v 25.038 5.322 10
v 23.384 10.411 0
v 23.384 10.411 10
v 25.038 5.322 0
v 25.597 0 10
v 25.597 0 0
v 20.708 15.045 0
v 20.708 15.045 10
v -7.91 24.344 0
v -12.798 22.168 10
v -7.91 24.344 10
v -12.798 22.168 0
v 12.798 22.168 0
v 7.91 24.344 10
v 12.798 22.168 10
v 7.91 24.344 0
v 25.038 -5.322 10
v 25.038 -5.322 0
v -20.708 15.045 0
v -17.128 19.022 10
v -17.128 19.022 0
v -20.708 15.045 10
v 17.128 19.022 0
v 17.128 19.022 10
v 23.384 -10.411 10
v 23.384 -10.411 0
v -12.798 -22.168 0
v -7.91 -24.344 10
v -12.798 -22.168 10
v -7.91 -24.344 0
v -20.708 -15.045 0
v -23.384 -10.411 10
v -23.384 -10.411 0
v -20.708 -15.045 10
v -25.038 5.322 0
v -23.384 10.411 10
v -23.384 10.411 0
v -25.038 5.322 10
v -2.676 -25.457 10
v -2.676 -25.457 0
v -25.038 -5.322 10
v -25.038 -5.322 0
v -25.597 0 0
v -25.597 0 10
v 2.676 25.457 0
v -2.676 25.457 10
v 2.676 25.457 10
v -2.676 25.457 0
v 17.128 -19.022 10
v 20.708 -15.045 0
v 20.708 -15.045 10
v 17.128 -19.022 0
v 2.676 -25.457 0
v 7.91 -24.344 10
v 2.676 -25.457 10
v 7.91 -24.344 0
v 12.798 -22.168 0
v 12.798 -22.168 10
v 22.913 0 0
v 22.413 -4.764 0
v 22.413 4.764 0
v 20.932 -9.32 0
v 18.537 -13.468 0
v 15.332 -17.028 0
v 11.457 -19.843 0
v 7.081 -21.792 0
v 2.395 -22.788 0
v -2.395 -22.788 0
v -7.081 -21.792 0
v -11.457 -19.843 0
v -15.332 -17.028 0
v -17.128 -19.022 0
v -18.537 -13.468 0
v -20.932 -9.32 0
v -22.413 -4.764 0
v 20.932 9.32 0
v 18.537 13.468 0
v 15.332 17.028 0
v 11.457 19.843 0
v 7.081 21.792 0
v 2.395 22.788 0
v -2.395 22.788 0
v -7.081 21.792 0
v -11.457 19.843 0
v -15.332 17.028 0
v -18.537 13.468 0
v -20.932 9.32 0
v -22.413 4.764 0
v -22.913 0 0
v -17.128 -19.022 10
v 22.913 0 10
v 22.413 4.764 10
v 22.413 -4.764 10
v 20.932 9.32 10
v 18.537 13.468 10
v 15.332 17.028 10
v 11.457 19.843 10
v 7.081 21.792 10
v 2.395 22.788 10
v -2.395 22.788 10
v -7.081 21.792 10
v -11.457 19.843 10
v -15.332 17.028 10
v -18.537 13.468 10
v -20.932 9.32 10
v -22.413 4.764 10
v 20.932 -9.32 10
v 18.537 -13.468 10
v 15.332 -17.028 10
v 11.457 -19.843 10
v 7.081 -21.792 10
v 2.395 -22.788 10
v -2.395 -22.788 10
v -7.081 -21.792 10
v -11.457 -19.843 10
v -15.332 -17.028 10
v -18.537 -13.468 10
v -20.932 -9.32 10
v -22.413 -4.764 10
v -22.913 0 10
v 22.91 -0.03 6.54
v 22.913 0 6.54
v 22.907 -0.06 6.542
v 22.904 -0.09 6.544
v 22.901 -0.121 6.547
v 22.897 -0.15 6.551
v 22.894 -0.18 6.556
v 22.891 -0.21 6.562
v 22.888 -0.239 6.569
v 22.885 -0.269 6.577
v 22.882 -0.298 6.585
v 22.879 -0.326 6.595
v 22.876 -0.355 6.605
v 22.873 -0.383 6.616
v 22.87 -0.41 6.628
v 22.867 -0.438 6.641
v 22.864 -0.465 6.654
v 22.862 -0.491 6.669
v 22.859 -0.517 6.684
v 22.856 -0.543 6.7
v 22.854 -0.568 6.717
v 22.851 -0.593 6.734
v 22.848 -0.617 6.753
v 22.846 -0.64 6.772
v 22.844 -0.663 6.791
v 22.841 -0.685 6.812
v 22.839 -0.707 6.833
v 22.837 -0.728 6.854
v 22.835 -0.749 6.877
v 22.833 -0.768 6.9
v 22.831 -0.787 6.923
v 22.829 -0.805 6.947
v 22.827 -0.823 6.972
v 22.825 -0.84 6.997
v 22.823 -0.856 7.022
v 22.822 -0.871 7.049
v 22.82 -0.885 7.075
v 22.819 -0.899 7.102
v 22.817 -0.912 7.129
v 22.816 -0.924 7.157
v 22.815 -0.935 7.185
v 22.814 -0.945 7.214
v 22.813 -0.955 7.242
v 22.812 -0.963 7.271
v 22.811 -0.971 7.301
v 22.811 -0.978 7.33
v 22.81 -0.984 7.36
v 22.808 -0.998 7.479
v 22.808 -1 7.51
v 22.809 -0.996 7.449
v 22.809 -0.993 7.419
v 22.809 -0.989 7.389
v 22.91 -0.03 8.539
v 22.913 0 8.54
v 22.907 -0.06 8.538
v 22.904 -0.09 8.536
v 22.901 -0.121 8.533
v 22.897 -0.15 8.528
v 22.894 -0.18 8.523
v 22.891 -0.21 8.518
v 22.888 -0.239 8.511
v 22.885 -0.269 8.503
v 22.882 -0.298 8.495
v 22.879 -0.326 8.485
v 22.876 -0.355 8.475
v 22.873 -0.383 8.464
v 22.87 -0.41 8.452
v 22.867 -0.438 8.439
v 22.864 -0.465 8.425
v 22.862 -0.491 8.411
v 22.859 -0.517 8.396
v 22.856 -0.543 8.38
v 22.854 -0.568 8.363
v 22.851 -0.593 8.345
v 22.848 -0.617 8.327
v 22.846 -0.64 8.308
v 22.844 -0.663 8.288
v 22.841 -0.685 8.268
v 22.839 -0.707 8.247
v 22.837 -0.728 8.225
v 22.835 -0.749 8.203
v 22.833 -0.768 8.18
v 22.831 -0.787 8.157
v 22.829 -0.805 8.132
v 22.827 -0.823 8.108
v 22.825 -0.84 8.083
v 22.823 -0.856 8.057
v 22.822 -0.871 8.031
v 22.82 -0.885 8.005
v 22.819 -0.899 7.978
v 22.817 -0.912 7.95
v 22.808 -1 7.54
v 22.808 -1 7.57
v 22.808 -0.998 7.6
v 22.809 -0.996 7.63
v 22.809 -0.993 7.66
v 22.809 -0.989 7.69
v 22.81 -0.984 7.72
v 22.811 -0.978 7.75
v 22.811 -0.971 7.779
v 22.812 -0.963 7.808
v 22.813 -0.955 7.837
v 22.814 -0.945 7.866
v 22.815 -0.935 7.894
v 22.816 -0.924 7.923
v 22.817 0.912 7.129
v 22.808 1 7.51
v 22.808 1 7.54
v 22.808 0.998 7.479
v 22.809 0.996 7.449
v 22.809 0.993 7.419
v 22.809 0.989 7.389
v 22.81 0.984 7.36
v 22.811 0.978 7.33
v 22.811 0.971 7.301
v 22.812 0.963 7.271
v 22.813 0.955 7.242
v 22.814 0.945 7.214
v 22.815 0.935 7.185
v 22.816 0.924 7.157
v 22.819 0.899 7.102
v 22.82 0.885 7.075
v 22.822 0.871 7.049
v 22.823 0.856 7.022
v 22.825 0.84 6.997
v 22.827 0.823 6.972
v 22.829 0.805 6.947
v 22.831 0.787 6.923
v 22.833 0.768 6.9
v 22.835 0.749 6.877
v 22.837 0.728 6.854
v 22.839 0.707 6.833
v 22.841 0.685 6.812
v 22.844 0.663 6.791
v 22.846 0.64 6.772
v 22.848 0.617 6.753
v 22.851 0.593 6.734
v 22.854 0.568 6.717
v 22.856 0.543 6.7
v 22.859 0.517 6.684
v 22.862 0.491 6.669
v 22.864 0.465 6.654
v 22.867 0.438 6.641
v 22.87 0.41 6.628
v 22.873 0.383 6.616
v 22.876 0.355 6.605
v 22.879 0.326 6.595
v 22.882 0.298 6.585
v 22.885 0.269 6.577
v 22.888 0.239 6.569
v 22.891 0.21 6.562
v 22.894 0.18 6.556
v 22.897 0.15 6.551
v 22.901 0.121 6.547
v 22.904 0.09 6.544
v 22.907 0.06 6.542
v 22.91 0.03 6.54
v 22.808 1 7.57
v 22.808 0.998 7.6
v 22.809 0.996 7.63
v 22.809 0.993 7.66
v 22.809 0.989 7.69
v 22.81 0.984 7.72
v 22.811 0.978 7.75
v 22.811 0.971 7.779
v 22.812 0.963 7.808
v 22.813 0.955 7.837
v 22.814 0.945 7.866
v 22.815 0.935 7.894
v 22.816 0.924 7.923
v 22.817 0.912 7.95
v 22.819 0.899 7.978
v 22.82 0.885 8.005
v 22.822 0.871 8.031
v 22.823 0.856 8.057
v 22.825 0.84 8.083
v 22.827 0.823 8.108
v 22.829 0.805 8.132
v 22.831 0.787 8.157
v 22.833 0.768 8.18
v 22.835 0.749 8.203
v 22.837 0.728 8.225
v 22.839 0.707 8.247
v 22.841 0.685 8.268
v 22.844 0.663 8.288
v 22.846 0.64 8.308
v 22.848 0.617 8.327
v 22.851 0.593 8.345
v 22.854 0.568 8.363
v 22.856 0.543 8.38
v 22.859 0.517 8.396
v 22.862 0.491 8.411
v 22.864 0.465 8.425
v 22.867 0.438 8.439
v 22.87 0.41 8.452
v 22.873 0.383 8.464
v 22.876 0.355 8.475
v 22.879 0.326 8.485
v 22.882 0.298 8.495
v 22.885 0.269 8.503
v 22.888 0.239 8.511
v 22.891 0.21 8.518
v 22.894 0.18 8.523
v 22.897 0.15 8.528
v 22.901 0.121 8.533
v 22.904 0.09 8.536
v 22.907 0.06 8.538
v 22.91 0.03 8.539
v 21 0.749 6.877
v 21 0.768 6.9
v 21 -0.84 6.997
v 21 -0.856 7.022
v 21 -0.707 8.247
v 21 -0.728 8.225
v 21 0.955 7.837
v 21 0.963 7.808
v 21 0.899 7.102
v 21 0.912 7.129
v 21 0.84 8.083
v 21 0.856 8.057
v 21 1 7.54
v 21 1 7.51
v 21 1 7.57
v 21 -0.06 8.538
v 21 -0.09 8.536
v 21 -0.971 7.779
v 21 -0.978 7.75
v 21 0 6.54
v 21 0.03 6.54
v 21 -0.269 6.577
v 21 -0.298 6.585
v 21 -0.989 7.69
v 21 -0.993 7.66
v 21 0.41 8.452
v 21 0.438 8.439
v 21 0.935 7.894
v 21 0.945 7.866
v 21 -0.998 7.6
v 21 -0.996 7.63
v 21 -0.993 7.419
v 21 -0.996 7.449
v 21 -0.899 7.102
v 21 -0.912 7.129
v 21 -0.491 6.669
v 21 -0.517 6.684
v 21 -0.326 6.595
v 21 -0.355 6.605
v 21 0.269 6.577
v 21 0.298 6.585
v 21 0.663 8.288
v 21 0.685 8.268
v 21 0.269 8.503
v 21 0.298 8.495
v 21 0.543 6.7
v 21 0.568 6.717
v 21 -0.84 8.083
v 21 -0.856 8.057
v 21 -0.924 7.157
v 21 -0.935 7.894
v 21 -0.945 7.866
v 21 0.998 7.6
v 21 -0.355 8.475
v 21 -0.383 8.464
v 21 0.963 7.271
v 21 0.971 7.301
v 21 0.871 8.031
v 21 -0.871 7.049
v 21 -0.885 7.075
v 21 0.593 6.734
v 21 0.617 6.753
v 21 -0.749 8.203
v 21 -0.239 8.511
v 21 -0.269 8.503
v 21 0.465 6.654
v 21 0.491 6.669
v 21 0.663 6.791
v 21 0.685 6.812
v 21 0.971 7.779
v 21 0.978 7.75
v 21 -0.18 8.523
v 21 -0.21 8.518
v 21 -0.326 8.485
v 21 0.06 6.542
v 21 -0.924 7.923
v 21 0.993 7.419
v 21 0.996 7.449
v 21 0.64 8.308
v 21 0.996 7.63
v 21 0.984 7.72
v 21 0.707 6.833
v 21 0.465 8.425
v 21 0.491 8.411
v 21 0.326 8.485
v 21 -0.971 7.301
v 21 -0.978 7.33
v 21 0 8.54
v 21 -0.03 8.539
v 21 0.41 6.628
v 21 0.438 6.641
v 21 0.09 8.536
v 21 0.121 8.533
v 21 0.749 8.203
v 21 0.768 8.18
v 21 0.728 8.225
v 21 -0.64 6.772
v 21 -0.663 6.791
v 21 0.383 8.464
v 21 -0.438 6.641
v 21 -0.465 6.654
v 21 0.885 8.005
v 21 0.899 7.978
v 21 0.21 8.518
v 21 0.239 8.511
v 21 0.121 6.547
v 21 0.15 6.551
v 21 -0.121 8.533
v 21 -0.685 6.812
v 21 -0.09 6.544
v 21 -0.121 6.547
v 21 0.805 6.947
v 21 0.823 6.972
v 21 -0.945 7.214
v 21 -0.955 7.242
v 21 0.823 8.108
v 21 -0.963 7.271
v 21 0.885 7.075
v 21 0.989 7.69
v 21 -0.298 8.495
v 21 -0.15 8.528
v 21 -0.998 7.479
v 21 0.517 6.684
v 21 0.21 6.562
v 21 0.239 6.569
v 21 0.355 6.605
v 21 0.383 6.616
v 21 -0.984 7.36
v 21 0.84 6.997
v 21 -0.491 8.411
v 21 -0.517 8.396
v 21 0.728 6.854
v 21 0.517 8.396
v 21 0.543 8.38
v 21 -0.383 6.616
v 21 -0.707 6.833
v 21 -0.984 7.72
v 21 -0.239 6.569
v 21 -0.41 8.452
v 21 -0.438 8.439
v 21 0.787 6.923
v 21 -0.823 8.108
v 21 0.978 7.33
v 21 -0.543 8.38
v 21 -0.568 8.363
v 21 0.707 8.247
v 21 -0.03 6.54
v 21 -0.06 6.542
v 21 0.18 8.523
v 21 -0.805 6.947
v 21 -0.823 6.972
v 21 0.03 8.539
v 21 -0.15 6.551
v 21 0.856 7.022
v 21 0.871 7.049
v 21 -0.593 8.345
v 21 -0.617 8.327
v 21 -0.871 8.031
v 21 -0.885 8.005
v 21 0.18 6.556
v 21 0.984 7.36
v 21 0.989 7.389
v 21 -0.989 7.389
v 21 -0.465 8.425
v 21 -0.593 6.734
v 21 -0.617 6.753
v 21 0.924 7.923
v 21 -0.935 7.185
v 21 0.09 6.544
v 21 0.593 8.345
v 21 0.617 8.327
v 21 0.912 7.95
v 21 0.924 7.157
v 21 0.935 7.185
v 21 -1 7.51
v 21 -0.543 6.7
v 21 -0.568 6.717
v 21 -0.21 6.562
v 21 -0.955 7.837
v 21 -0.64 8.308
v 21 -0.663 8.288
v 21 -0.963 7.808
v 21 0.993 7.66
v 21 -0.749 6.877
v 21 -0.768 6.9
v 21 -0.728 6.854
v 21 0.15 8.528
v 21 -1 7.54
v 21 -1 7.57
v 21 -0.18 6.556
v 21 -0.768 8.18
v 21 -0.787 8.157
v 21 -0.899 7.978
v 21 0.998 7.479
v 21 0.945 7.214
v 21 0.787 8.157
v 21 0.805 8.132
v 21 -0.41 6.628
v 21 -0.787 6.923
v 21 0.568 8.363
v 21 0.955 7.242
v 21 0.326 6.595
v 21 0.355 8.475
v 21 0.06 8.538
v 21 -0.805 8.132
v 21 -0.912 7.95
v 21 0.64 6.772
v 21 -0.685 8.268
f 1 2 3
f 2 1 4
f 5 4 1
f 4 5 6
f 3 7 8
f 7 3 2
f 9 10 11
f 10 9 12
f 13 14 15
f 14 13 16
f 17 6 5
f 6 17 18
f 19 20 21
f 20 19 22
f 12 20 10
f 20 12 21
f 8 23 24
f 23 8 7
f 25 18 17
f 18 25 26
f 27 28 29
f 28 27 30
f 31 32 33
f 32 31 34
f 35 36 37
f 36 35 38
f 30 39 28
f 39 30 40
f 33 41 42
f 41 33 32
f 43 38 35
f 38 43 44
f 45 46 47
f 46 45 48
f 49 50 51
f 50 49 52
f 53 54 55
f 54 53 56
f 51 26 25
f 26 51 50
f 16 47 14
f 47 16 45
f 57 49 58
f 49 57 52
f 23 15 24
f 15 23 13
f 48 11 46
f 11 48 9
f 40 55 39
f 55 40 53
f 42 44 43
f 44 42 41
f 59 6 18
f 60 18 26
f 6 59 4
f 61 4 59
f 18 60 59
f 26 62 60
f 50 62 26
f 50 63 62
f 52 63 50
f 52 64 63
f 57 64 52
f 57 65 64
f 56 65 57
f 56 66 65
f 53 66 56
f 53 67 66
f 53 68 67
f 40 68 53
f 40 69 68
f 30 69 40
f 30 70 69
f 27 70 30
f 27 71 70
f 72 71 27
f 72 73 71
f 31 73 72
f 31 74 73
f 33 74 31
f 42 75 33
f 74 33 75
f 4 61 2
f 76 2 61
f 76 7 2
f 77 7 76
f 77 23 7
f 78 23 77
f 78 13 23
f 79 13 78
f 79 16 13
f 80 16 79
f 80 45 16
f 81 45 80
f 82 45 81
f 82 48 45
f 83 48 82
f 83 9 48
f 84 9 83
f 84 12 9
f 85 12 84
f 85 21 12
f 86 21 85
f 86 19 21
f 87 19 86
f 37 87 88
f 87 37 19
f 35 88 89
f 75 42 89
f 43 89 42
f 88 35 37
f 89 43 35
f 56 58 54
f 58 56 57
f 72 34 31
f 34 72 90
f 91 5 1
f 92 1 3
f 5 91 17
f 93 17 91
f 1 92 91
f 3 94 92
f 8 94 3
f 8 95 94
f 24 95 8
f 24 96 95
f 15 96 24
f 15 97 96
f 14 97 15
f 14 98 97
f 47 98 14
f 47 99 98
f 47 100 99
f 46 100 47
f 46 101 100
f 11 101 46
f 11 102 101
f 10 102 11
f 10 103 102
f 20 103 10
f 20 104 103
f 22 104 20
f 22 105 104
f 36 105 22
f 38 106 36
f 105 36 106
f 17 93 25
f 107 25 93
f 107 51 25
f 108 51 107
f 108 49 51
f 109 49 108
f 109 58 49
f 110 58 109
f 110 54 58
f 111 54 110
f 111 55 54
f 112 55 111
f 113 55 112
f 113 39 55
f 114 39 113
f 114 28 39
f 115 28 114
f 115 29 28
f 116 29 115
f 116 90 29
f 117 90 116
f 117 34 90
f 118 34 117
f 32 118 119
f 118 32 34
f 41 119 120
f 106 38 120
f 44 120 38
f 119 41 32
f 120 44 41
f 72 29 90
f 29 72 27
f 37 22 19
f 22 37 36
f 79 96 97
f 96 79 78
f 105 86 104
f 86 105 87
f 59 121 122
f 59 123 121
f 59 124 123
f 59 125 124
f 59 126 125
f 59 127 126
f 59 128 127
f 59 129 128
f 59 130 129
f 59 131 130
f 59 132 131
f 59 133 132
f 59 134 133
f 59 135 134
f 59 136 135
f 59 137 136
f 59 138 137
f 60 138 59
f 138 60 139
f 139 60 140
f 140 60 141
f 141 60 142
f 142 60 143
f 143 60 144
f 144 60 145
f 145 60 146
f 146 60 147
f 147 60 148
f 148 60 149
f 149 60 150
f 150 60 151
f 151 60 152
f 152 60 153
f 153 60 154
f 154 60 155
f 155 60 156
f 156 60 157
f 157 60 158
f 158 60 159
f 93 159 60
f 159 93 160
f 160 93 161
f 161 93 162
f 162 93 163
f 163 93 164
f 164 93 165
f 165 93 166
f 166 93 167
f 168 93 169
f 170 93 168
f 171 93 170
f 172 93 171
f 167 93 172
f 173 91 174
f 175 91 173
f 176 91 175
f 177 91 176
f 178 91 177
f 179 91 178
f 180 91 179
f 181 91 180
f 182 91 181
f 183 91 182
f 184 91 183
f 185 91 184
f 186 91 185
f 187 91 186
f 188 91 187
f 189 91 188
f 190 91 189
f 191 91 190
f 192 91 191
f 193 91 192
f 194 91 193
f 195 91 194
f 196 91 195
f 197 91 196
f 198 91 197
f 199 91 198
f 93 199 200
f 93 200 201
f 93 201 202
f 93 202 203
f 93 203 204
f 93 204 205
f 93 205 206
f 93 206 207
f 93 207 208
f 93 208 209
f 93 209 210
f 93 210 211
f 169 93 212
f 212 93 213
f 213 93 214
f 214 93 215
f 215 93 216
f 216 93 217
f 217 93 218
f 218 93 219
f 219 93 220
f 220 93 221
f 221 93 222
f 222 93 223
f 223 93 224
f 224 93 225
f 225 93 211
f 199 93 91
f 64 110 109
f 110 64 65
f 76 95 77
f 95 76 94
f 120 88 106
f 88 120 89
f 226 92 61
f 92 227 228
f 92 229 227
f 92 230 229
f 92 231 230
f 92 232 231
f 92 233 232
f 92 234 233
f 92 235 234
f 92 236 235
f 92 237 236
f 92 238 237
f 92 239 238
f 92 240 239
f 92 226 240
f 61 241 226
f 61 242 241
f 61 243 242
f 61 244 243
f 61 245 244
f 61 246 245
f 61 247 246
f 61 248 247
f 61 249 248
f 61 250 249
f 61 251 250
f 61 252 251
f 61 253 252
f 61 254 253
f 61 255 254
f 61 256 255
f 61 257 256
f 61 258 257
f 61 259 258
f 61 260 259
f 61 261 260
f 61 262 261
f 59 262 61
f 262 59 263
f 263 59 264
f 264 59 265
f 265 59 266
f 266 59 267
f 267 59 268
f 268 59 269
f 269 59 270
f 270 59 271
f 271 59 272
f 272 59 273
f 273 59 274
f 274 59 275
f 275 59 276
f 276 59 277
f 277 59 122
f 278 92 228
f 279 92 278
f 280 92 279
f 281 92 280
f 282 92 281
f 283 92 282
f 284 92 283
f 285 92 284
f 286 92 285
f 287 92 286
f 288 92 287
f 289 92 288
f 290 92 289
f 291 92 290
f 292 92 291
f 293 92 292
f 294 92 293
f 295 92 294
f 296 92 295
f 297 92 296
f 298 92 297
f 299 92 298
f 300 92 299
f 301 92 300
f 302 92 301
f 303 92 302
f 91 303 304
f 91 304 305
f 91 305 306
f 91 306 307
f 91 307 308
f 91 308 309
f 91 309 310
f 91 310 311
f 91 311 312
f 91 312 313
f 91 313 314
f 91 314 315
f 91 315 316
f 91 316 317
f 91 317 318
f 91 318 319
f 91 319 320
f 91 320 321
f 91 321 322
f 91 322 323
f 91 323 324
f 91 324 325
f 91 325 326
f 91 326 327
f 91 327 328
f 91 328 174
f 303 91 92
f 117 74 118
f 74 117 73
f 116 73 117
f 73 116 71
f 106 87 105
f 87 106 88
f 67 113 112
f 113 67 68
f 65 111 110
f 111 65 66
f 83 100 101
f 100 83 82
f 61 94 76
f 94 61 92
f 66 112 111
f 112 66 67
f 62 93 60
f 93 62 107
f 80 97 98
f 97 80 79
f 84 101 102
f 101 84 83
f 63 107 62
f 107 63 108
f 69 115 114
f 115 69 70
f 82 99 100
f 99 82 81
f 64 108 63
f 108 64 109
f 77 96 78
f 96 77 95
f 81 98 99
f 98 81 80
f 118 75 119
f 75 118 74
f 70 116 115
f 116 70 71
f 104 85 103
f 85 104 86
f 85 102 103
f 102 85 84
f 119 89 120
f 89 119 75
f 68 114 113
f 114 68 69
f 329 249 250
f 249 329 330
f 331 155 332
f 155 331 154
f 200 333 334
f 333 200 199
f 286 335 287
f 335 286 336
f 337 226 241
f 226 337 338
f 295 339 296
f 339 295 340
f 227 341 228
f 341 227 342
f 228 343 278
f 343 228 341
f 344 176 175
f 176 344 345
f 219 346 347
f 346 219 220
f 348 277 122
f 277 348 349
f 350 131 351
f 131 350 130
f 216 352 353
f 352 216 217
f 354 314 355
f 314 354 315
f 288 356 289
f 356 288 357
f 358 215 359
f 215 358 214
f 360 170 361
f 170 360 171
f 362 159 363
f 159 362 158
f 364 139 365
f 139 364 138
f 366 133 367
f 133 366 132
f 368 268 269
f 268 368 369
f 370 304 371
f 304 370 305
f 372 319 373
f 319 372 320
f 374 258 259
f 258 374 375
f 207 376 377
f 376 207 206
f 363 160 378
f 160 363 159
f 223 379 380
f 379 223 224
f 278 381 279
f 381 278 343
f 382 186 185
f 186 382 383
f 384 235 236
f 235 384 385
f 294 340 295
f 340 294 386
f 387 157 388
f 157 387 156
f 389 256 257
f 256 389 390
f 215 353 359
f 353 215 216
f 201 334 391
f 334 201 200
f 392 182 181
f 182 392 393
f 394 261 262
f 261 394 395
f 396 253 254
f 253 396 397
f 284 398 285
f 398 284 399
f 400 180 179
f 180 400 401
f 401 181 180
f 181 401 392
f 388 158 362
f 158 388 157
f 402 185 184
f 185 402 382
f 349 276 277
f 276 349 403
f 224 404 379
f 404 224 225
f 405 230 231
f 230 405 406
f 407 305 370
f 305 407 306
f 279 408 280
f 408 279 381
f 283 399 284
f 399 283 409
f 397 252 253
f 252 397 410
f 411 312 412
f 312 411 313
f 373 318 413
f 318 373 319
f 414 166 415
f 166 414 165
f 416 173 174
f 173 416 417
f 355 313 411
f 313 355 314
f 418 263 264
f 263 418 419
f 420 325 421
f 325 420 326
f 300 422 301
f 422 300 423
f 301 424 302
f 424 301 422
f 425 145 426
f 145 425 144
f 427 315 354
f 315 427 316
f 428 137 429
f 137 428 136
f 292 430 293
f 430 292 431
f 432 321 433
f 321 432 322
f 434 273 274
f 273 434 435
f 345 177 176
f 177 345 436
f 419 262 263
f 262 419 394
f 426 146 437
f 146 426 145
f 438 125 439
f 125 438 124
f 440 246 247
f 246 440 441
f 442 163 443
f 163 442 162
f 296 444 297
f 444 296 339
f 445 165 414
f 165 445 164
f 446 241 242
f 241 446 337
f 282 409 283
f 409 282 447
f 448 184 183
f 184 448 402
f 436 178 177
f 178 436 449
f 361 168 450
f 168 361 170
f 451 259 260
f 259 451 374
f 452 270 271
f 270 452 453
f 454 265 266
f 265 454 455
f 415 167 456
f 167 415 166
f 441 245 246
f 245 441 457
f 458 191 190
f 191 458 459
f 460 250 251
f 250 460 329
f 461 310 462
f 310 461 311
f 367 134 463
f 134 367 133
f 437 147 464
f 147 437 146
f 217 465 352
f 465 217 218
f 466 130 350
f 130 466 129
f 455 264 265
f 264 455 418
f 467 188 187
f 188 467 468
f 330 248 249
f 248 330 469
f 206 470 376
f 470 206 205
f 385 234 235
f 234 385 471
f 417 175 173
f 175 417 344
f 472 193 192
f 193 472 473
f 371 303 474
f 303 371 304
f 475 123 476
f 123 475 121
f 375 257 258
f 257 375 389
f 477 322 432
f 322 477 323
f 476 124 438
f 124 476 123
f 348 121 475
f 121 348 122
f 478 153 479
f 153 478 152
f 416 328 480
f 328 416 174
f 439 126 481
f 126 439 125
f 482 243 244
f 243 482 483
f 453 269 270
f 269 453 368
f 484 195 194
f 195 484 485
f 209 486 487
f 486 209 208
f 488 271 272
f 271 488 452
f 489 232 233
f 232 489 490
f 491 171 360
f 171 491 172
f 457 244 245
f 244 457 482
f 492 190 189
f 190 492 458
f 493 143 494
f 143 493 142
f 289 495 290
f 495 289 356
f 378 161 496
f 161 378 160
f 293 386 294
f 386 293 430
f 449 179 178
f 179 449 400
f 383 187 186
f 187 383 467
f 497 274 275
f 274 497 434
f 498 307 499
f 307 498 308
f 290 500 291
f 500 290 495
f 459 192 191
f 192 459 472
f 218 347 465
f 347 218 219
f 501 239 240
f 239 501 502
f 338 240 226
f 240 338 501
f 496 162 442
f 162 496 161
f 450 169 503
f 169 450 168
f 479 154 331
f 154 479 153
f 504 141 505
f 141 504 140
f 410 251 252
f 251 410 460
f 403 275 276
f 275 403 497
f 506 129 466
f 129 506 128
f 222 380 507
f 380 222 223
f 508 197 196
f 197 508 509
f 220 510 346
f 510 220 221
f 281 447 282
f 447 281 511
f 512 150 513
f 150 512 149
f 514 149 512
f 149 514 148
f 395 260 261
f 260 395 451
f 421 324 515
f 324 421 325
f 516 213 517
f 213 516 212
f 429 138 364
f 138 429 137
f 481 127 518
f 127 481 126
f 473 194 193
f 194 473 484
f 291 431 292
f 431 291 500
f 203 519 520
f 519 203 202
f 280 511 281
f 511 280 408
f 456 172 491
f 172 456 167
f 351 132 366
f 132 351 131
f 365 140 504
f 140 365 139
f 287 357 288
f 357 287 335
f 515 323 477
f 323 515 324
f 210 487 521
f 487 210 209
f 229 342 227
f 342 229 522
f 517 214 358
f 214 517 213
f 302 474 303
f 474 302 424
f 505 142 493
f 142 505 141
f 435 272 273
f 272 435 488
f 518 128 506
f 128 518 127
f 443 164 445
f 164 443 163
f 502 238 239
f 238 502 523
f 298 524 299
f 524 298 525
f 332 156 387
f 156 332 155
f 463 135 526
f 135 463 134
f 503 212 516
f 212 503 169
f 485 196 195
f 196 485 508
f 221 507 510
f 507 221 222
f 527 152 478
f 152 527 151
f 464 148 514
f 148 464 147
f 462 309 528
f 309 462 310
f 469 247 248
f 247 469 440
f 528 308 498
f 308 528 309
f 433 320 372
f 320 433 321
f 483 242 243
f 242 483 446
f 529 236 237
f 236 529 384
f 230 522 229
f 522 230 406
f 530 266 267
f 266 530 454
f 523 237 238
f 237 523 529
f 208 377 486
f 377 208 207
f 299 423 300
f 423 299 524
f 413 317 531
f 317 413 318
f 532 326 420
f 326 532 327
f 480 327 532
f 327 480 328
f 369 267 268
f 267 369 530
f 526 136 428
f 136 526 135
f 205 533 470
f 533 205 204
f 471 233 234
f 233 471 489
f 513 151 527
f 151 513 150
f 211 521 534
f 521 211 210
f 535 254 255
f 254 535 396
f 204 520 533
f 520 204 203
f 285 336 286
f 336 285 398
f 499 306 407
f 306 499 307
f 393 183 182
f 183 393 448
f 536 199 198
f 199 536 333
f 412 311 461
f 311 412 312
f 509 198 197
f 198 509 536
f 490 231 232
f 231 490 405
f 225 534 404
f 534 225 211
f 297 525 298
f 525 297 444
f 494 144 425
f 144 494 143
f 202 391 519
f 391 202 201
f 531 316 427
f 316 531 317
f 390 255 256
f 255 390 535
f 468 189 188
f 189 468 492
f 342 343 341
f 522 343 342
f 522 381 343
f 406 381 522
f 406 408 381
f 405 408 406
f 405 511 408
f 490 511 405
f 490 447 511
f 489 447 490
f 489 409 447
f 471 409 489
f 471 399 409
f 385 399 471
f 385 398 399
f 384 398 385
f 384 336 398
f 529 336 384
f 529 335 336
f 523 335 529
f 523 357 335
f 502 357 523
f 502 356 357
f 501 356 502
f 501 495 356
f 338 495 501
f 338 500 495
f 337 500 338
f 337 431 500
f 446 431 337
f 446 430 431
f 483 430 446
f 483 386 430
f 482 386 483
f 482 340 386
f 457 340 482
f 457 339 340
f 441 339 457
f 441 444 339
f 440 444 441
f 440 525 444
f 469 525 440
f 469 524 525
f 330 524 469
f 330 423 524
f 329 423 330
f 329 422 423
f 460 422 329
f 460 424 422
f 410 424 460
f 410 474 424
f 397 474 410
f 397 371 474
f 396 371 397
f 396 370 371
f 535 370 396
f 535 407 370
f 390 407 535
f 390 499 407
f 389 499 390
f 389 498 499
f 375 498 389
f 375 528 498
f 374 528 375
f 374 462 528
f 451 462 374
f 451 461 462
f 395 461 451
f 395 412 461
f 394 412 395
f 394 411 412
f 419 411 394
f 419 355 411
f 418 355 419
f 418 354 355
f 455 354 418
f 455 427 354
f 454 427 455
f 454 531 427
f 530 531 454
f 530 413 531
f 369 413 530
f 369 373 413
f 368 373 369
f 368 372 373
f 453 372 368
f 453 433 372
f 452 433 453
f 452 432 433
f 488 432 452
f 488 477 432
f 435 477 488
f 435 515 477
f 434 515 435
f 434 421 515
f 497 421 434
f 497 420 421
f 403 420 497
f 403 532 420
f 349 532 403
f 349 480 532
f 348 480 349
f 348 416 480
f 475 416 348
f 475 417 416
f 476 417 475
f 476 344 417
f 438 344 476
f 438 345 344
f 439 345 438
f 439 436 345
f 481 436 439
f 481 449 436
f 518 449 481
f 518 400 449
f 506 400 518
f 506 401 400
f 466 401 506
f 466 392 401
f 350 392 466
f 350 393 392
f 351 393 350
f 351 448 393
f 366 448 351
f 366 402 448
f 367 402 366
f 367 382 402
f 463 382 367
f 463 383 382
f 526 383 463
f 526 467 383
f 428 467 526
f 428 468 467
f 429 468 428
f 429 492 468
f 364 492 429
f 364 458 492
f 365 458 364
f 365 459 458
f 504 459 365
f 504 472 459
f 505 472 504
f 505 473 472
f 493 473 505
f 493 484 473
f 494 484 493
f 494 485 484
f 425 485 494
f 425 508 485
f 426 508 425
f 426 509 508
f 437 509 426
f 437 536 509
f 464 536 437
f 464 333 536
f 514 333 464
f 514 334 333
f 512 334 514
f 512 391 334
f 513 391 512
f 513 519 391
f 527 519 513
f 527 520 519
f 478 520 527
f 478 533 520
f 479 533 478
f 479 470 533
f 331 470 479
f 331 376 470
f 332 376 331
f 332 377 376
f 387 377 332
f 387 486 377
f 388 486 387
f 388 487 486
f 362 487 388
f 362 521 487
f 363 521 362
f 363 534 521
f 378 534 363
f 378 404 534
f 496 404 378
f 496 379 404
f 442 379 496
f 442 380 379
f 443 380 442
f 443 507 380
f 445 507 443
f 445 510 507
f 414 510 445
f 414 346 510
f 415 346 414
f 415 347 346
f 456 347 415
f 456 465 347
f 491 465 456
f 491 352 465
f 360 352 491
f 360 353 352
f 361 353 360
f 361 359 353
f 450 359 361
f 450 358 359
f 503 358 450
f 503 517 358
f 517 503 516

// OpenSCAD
data = [[true, true, true, true, true, true, true, true, true, true, true, true, true, true, true, true, true, true, true, true, true, true, true, true, true, true, true, true, true, true, true, true, true, true, true, true, true, true, true, true, true, true, true, true, true, true, true, true, true, true], [false, false, false, false, false, false, false, false, false, false, false, false, false, false, false, false, false, false, false, false, false, false, false, false, false, false, false, false, false, false, false, false, false, false, false, false, false, false, false, false, false, false, false, false, false, false, false, false, false, false], [true, true, true, true, true, true, true, true, true, true, true, true, true, true, false, true, true, true, true, true, true, true, false, true, false, true, true, false, true, true, true, true, false, true, true, true, true, true, true, false, true, true, true, false, true, true, true, true, false, true], [true, false, true, false, true, true, true, false, false, true, true, false, true, false, false, true, false, true, false, false, false, true, false, true, false, true, true, false, false, false, false, true, false, false, false, false, false, false, true, false, false, false, true, false, true, false, false, false, false, true], [false, false, false, false, false, false, true, true, false, true, false, false, true, false, true, true, false, true, false, true, false, true, false, true, false, false, true, true, true, true, true, true, true, true, true, true, true, false, true, false, true, true, true, false, true, true, true, true, false, false], [true, true, true, true, true, true, true, false, false, true, true, false, true, false, true, false, false, true, false, true, false, true, false, true, true, false, false, false, false, false, true, true, false, false, false, false, false, false, true, false, false, false, true, false, true, false, false, false, false, true], [false, false, false, false, true, false, true, true, false, false, false, false, true, false, true, true, false, true, false, true, false, true, false, true, true, false, true, true, true, false, true, true, false, true, true, true, true, true, true, true, true, false, true, false, true, true, true, true, false, false], [false, true, false, true, true, false, false, false, false, true, true, false, true, true, true, false, false, true, false, true, false, true, false, true, false, false, true, false, true, false, false, true, false, false, false, false, false, false, true, false, false, false, true, false, true, true, true, true, true, true], [true, true, true, true, false, false, true, true, false, true, false, false, false, false, true, true, false, true, false, true, false, true, true, true, false, true, true, false, true, true, false, true, true, true, true, true, true, false, true, false, true, true, true, false, false, false, false, false, false, true], [true, true, true, true, true, false, true, false, false, true, true, false, true, false, true, false, false, true, false, true, false, true, false, true, false, true, false, false, false, true, false, true, false, false, false, false, false, false, true, false, true, true, true, true, false, true, false, true, false, true], [false, true, false, true, true, true, true, true, false, true, false, false, true, false, true, true, false, true, false, true, false, true, false, true, false, false, false, true, false, true, false, true, false, true, true, true, true, true, true, false, false, false, false, true, true, true, true, true, true, true], [false, false, false, false, false, false, true, false, false, true, true, false, true, false, false, false, false, true, false, true, false, true, false, true, true, false, true, true, false, true, false, true, false, false, false, false, false, false, true, true, true, true, false, false, false, false, false, false, false, false], [false, true, false, true, false, true, true, true, false, true, false, false, true, false, true, true, false, true, false, true, false, true, false, true, true, false, true, false, false, true, true, true, true, true, true, true, true, false, false, false, false, true, false, true, false, true, false, true, false, true], [false, true, false, true, true, true, true, false, false, true, true, true, true, false, true, false, false, true, false, true, false, true, false, true, false, false, true, false, true, true, false, true, false, false, false, false, false, false, true, true, false, true, false, true, true, true, true, true, true, true], [false, false, false, true, true, false, true, true, false, false, false, false, true, true, true, true, false, true, false, true, false, true, false, false, false, true, true, false, true, true, false, true, false, true, true, true, true, true, true, true, false, true, false, false, true, false, false, false, false, false], [false, true, false, true, false, false, false, false, false, true, true, false, true, false, true, false, false, true, false, true, false, true, false, true, false, true, false, false, false, true, false, true, false, false, false, true, false, false, false, true, false, true, true, false, true, true, false, true, false, true], [true, true, true, true, true, true, true, true, true, true, true, false, true, false, true, true, false, true, false, true, false, true, false, true, false, true, false, true, false, true, false, true, true, true, false, false, false, true, false, true, false, true, true, false, true, true, true, true, false, true], [false, false, false, false, false, false, false, false, false, false, true, false, true, false, true, false, false, true, false, true, false, true, false, true, true, true, false, true, false, true, false, true, true, true, true, true, true, true, false, true, false, true, true, false, true, false, false, false, false, false], [false, true, false, true, false, true, false, true, false, true, true, false, true, false, true, true, false, true, true, true, false, true, true, true, false, false, false, true, false, false, false, true, false, false, false, false, false, false, false, true, false, true, false, false, true, true, false, true, false, true], [true, true, false, true, true, true, true, true, true, true, true, false, true, false, true, false, false, false, false, true, false, false, false, false, false, true, true, true, true, true, false, true, true, true, true, true, true, true, true, true, false, true, false, true, true, true, true, true, true, true], [false, false, false, false, false, false, false, false, false, false, true, false, true, false, true, true, true, true, false, true, false, true, true, true, false, false, false, false, true, false, false, false, false, false, false, false, false, false, false, true, false, true, false, true, false, false, false, false, false, false], [true, false, true, false, true, false, true, false, true, false, true, false, true, false, false, false, false, false, false, false, false, true, false, true, true, true, false, true, true, true, true, true, true, true, true, true, true, true, true, true, false, true, false, true, true, false, true, false, true, false], [true, true, true, true, true, false, true, true, true, true, true, false, true, true, true, true, true, true, true, true, true, true, false, false, false, false, false, false, false, false, false, false, false, true, false, false, false, false, false, false, false, true, false, true, true, true, true, true, true, true], [false, false, false, false, false, false, true, false, false, false, false, false, false, false, false, false, true, false, false, false, false, true, true, true, true, true, false, true, true, true, true, true, true, true, false, true, true, true, true, true, true, true, false, false, true, false, false, false, false, false], [true, false, true, false, true, true, true, false, true, true, true, false, true, true, true, false, true, false, true, true, false, true, false, false, false, false, false, false, false, true, false, false, false, false, false, false, false, false, false, false, false, true, true, false, true, false, true, false, true, false], [true, true, true, true, true, false, false, false, false, false, true, false, true, false, false, false, false, false, true, false, false, true, true, true, true, true, false, true, true, true, false, true, true, true, false, true, true, true, false, true, true, true, true, false, true, false, true, true, true, false], [true, false, true, true, true, false, true, true, true, false, true, true, true, false, true, true, true, false, true, true, false, true, false, false, false, false, false, true, false, false, false, false, false, true, false, true, false, false, false, false, false, true, true, false, true, false, false, false, true, false], [true, false, false, true, false, false, false, true, false, false, false, true, false, false, false, true, false, false, false, true, false, true, true, false, true, false, true, true, false, true, true, true, false, true, true, true, false, true, true, true, false, true, true, false, true, true, true, false, true, false], [true, true, false, true, false, true, false, true, false, true, false, true, false, true, false, true, false, true, false, true, false, true, true, false, true, true, true, false, false, false, true, false, false, false, true, false, false, false, true, false, false, true, false, false, false, false, true, false, true, false], [true, false, false, true, true, true, false, true, true, true, false, true, false, true, false, true, false, true, false, true, false, true, false, false, false, false, true, false, true, false, true, false, true, false, true, false, true, false, true, false, true, true, false, true, true, false, true, false, true, false], [true, true, false, false, false, false, false, false, false, true, false, true, false, true, false, true, false, true, false, true, false, true, false, true, false, true, true, false, true, false, true, false, true, false, true, false, true, false, true, true, true, true, false, true, false, false, true, false, true, false], [true, true, true, true, true, true, true, true, true, true, true, true, false, true, true, true, true, true, true, true, true, true, true, true, true, true, true, true, true, true, true, false, true, true, true, true, true, true, true, true, true, true, false, true, false, true, true, true, true, true], [false, false, false, false, false, false, false, false, false, false, false, false, false, false, true, false, false, false, false, false, false, false, false, false, false, false, false, false, false, false, false, false, false, false, false, false, false, false, false, false, false, true, false, true, false, false, true, false, false, false], [true, true, true, true, false, true, true, false, true, false, true, false, true, true, true, true, true, true, false, true, true, false, true, true, false, true, true, true, true, true, true, false, true, true, true, false, true, true, true, false, true, true, false, true, true, false, true, true, false, true], [false, false, false, false, false, true, false, false, true, false, true, false, true, false, false, false, false, false, false, false, false, false, false, false, false, false, false, true, false, false, false, false, false, false, false, false, false, false, false, false, false, true, false, false, true, false, true, false, false, true], [false, true, false, true, false, true, false, true, true, false, true, false, true, true, true, false, true, true, true, false, true, true, true, false, true, true, true, true, true, true, false, true, true, false, true, true, true, true, false, true, true, true, true, false, true, false, true, false, true, true], [true, true, false, true, true, true, false, true, false, false, true, false, false, true, false, false, false, false, false, false, false, true, false, false, false, false, false, false, true, false, false, false, false, false, false, true, false, false, false, false, false, true, true, false, true, false, true, false, true, true], [false, false, false, true, true, false, false, true, false, true, true, true, false, true, true, true, false, true, false, true, true, true, true, true, false, true, true, false, true, true, true, false, true, true, false, true, true, false, true, true, false, true, true, false, true, false, true, true, true, false], [true, false, true, true, true, false, true, true, false, false, true, true, false, true, false, false, false, true, false, false, false, false, false, false, false, true, false, false, true, false, false, false, true, false, false, true, false, false, true, false, false, false, true, false, true, false, false, false, true, false], [true, false, false, false, true, false, true, false, false, true, true, false, false, true, true, true, true, true, true, true, false, true, true, true, false, true, true, true, true, true, true, true, true, true, true, true, true, true, true, true, true, true, true, false, true, true, true, true, true, false], [true, false, true, true, true, false, true, true, false, false, true, false, true, true, false, true, false, true, false, true, false, false, true, false, false, true, false, true, false, true, false, true, false, true, false, true, false, true, false, true, false, true, true, false, false, false, false, false, true, false], [true, false, true, false, false, false, true, true, true, false, true, false, true, true, false, false, false, false, false, false, false, true, true, true, false, false, false, false, false, false, false, false, false, false, false, false, false, false, false, false, false, true, true, true, true, true, true, true, true, false], [true, false, true, false, true, false, true, true, false, false, true, false, false, true, true, false, true, false, true, false, true, true, false, true, true, false, true, false, true, false, true, false, true, false, true, false, true, false, true, false, true, true, false, false, false, false, false, false, false, false], [true, false, true, false, true, false, false, true, false, true, true, true, false, true, false, false, true, true, true, true, true, true, false, true, true, true, true, true, true, true, true, true, true, true, true, true, true, true, true, true, true, true, false, true, true, true, true, true, true, true], [false, false, true, false, true, true, false, true, false, false, true, true, false, true, false, true, true, false, false, false, true, false, false, false, true, false, false, false, false, false, false, true, false, true, true, false, false, false, false, false, false, false, false, true, false, true, true, false, false, false], [false, true, true, false, false, true, false, true, false, true, true, false, false, true, false, false, true, false, true, false, true, false, true, false, true, false, true, false, true, true, true, true, false, true, false, false, true, true, false, true, true, true, true, true, false, true, false, false, true, true], [false, true, true, true, false, true, false, true, false, false, true, false, true, true, true, false, true, false, true, false, true, false, true, false, true, false, true, false, true, false, true, true, false, true, true, false, true, false, false, true, false, false, true, true, false, true, true, false, true, false], [false, true, false, false, false, true, false, true, true, false, true, false, true, true, false, false, true, false, true, false, true, false, true, false, true, false, true, false, true, false, true, false, false, false, false, false, true, true, false, true, true, false, true, false, false, false, false, false, true, true], [false, true, false, true, false, true, false, false, true, false, true, false, false, true, false, true, true, false, true, false, false, false, true, false, false, false, true, false, false, false, true, true, false, true, true, false, true, false, false, true, false, false, true, true, false, true, true, false, true, false], [false, true, false, true, false, true, true, false, true, false, true, true, false, true, false, false, true, false, true, true, false, true, true, true, false, true, true, true, true, false, true, false, false, true, false, false, true, true, false, true, true, false, true, false, false, true, false, false, true, true], [false, true, false, true, false, false, true, false, true, false, false, true, false, true, true, false, true, false, true, false, false, false, true, false, false, false, false, true, false, false, true, true, false, true, true, false, false, false, false, true, false, false, true, true, false, true, true, false, false, false], [false, true, false, true, true, false, true, true, true, true, false, true, false, true, false, false, true, false, true, false, true, false, true, true, true, false, true, true, true, false, true, false, false, true, false, false, true, true, false, true, true, false, true, false, false, true, false, false, true, true], [false, true, false, true, true, false, true, true, false, true, true, true, true, true, false, true, true, false, true, false, true, false, true, false, false, false, false, true, false, false, true, true, false, true, true, false, true, false, false, true, false, false, true, true, false, true, true, false, true, false], [false, true, false, true, false, false, true, false, false, false, false, false, false, false, false, true, false, false, true, false, true, false, true, true, true, true, true, true, true, false, true, false, false, false, false, false, true, true, false, true, true, false, true, false, false, false, false, false, true, true], [false, true, false, true, false, true, true, false, true, true, true, true, true, true, true, true, false, false, true, false, true, false, false, false, false, false, false, true, false, false, true, true, false, true, true, false, false, false, false, true, false, false, true, true, false, true, true, false, false, false], [false, true, false, true, false, false, true, false, false, true, false, false, false, false, false, false, false, false, true, false, true, true, false, true, true, true, true, true, true, false, false, false, false, true, false, false, true, true, false, true, true, false, false, false, false, true, false, false, true, true], [false, true, false, true, true, false, true, false, true, true, false, true, false, false, false, true, false, false, true, false, false, true, false, false, false, false, false, true, false, false, true, true, false, true, true, false, false, false, false, true, false, false, true, true, false, true, true, false, false, false], [false, true, false, true, false, false, true, false, false, true, false, true, true, true, true, true, false, false, true, false, true, true, true, false, true, true, true, true, true, false, true, false, false, true, false, false, true, true, false, true, true, false, true, false, false, true, false, false, true, true], [false, true, false, true, true, false, true, false, true, true, false, true, false, false, false, false, false, false, true, false, false, true, true, false, false, false, false, true, false, false, true, true, false, true, true, false, true, false, false, true, false, false, true, true, false, true, true, false, true, false], [true, true, true, true, true, true, true, true, true, true, false, true, true, true, true, true, true, true, true, true, true, true, true, true, true, true, true, true, true, true, true, true, true, true, true, true, true, true, true, true, true, true, true, true, true, true, true, true, true, true]];

IN_MM_CONVERSION = 25.4;
options = len(data[0]);
radius = 20;
slice_height = (radius * 2 * PI)/len(data[0]);
ang = 360/options;
wall_radius = radius + slice_height;
bottom_thickness = 8;
pvc_outer_radius = ((2.375)/2 * IN_MM_CONVERSION);
pvc_inner_radius = ((2.047)/2 * IN_MM_CONVERSION);
handle_radius = pvc_outer_radius + slice_height + 1;
indentation_depth = 5;
echo(pvc_inner_radius);
echo(wall_radius);
echo(len(data));
echo(len(data[0]));
difference() {
    cylinder(h=10, r=pvc_inner_radius-.4);

    cylinder(h=20,r=wall_radius+.4);
}
translate([21, 0, slice_height*3])
rotate([0, 90, 0])
cylinder(r=1,h=2,$fn=208);
